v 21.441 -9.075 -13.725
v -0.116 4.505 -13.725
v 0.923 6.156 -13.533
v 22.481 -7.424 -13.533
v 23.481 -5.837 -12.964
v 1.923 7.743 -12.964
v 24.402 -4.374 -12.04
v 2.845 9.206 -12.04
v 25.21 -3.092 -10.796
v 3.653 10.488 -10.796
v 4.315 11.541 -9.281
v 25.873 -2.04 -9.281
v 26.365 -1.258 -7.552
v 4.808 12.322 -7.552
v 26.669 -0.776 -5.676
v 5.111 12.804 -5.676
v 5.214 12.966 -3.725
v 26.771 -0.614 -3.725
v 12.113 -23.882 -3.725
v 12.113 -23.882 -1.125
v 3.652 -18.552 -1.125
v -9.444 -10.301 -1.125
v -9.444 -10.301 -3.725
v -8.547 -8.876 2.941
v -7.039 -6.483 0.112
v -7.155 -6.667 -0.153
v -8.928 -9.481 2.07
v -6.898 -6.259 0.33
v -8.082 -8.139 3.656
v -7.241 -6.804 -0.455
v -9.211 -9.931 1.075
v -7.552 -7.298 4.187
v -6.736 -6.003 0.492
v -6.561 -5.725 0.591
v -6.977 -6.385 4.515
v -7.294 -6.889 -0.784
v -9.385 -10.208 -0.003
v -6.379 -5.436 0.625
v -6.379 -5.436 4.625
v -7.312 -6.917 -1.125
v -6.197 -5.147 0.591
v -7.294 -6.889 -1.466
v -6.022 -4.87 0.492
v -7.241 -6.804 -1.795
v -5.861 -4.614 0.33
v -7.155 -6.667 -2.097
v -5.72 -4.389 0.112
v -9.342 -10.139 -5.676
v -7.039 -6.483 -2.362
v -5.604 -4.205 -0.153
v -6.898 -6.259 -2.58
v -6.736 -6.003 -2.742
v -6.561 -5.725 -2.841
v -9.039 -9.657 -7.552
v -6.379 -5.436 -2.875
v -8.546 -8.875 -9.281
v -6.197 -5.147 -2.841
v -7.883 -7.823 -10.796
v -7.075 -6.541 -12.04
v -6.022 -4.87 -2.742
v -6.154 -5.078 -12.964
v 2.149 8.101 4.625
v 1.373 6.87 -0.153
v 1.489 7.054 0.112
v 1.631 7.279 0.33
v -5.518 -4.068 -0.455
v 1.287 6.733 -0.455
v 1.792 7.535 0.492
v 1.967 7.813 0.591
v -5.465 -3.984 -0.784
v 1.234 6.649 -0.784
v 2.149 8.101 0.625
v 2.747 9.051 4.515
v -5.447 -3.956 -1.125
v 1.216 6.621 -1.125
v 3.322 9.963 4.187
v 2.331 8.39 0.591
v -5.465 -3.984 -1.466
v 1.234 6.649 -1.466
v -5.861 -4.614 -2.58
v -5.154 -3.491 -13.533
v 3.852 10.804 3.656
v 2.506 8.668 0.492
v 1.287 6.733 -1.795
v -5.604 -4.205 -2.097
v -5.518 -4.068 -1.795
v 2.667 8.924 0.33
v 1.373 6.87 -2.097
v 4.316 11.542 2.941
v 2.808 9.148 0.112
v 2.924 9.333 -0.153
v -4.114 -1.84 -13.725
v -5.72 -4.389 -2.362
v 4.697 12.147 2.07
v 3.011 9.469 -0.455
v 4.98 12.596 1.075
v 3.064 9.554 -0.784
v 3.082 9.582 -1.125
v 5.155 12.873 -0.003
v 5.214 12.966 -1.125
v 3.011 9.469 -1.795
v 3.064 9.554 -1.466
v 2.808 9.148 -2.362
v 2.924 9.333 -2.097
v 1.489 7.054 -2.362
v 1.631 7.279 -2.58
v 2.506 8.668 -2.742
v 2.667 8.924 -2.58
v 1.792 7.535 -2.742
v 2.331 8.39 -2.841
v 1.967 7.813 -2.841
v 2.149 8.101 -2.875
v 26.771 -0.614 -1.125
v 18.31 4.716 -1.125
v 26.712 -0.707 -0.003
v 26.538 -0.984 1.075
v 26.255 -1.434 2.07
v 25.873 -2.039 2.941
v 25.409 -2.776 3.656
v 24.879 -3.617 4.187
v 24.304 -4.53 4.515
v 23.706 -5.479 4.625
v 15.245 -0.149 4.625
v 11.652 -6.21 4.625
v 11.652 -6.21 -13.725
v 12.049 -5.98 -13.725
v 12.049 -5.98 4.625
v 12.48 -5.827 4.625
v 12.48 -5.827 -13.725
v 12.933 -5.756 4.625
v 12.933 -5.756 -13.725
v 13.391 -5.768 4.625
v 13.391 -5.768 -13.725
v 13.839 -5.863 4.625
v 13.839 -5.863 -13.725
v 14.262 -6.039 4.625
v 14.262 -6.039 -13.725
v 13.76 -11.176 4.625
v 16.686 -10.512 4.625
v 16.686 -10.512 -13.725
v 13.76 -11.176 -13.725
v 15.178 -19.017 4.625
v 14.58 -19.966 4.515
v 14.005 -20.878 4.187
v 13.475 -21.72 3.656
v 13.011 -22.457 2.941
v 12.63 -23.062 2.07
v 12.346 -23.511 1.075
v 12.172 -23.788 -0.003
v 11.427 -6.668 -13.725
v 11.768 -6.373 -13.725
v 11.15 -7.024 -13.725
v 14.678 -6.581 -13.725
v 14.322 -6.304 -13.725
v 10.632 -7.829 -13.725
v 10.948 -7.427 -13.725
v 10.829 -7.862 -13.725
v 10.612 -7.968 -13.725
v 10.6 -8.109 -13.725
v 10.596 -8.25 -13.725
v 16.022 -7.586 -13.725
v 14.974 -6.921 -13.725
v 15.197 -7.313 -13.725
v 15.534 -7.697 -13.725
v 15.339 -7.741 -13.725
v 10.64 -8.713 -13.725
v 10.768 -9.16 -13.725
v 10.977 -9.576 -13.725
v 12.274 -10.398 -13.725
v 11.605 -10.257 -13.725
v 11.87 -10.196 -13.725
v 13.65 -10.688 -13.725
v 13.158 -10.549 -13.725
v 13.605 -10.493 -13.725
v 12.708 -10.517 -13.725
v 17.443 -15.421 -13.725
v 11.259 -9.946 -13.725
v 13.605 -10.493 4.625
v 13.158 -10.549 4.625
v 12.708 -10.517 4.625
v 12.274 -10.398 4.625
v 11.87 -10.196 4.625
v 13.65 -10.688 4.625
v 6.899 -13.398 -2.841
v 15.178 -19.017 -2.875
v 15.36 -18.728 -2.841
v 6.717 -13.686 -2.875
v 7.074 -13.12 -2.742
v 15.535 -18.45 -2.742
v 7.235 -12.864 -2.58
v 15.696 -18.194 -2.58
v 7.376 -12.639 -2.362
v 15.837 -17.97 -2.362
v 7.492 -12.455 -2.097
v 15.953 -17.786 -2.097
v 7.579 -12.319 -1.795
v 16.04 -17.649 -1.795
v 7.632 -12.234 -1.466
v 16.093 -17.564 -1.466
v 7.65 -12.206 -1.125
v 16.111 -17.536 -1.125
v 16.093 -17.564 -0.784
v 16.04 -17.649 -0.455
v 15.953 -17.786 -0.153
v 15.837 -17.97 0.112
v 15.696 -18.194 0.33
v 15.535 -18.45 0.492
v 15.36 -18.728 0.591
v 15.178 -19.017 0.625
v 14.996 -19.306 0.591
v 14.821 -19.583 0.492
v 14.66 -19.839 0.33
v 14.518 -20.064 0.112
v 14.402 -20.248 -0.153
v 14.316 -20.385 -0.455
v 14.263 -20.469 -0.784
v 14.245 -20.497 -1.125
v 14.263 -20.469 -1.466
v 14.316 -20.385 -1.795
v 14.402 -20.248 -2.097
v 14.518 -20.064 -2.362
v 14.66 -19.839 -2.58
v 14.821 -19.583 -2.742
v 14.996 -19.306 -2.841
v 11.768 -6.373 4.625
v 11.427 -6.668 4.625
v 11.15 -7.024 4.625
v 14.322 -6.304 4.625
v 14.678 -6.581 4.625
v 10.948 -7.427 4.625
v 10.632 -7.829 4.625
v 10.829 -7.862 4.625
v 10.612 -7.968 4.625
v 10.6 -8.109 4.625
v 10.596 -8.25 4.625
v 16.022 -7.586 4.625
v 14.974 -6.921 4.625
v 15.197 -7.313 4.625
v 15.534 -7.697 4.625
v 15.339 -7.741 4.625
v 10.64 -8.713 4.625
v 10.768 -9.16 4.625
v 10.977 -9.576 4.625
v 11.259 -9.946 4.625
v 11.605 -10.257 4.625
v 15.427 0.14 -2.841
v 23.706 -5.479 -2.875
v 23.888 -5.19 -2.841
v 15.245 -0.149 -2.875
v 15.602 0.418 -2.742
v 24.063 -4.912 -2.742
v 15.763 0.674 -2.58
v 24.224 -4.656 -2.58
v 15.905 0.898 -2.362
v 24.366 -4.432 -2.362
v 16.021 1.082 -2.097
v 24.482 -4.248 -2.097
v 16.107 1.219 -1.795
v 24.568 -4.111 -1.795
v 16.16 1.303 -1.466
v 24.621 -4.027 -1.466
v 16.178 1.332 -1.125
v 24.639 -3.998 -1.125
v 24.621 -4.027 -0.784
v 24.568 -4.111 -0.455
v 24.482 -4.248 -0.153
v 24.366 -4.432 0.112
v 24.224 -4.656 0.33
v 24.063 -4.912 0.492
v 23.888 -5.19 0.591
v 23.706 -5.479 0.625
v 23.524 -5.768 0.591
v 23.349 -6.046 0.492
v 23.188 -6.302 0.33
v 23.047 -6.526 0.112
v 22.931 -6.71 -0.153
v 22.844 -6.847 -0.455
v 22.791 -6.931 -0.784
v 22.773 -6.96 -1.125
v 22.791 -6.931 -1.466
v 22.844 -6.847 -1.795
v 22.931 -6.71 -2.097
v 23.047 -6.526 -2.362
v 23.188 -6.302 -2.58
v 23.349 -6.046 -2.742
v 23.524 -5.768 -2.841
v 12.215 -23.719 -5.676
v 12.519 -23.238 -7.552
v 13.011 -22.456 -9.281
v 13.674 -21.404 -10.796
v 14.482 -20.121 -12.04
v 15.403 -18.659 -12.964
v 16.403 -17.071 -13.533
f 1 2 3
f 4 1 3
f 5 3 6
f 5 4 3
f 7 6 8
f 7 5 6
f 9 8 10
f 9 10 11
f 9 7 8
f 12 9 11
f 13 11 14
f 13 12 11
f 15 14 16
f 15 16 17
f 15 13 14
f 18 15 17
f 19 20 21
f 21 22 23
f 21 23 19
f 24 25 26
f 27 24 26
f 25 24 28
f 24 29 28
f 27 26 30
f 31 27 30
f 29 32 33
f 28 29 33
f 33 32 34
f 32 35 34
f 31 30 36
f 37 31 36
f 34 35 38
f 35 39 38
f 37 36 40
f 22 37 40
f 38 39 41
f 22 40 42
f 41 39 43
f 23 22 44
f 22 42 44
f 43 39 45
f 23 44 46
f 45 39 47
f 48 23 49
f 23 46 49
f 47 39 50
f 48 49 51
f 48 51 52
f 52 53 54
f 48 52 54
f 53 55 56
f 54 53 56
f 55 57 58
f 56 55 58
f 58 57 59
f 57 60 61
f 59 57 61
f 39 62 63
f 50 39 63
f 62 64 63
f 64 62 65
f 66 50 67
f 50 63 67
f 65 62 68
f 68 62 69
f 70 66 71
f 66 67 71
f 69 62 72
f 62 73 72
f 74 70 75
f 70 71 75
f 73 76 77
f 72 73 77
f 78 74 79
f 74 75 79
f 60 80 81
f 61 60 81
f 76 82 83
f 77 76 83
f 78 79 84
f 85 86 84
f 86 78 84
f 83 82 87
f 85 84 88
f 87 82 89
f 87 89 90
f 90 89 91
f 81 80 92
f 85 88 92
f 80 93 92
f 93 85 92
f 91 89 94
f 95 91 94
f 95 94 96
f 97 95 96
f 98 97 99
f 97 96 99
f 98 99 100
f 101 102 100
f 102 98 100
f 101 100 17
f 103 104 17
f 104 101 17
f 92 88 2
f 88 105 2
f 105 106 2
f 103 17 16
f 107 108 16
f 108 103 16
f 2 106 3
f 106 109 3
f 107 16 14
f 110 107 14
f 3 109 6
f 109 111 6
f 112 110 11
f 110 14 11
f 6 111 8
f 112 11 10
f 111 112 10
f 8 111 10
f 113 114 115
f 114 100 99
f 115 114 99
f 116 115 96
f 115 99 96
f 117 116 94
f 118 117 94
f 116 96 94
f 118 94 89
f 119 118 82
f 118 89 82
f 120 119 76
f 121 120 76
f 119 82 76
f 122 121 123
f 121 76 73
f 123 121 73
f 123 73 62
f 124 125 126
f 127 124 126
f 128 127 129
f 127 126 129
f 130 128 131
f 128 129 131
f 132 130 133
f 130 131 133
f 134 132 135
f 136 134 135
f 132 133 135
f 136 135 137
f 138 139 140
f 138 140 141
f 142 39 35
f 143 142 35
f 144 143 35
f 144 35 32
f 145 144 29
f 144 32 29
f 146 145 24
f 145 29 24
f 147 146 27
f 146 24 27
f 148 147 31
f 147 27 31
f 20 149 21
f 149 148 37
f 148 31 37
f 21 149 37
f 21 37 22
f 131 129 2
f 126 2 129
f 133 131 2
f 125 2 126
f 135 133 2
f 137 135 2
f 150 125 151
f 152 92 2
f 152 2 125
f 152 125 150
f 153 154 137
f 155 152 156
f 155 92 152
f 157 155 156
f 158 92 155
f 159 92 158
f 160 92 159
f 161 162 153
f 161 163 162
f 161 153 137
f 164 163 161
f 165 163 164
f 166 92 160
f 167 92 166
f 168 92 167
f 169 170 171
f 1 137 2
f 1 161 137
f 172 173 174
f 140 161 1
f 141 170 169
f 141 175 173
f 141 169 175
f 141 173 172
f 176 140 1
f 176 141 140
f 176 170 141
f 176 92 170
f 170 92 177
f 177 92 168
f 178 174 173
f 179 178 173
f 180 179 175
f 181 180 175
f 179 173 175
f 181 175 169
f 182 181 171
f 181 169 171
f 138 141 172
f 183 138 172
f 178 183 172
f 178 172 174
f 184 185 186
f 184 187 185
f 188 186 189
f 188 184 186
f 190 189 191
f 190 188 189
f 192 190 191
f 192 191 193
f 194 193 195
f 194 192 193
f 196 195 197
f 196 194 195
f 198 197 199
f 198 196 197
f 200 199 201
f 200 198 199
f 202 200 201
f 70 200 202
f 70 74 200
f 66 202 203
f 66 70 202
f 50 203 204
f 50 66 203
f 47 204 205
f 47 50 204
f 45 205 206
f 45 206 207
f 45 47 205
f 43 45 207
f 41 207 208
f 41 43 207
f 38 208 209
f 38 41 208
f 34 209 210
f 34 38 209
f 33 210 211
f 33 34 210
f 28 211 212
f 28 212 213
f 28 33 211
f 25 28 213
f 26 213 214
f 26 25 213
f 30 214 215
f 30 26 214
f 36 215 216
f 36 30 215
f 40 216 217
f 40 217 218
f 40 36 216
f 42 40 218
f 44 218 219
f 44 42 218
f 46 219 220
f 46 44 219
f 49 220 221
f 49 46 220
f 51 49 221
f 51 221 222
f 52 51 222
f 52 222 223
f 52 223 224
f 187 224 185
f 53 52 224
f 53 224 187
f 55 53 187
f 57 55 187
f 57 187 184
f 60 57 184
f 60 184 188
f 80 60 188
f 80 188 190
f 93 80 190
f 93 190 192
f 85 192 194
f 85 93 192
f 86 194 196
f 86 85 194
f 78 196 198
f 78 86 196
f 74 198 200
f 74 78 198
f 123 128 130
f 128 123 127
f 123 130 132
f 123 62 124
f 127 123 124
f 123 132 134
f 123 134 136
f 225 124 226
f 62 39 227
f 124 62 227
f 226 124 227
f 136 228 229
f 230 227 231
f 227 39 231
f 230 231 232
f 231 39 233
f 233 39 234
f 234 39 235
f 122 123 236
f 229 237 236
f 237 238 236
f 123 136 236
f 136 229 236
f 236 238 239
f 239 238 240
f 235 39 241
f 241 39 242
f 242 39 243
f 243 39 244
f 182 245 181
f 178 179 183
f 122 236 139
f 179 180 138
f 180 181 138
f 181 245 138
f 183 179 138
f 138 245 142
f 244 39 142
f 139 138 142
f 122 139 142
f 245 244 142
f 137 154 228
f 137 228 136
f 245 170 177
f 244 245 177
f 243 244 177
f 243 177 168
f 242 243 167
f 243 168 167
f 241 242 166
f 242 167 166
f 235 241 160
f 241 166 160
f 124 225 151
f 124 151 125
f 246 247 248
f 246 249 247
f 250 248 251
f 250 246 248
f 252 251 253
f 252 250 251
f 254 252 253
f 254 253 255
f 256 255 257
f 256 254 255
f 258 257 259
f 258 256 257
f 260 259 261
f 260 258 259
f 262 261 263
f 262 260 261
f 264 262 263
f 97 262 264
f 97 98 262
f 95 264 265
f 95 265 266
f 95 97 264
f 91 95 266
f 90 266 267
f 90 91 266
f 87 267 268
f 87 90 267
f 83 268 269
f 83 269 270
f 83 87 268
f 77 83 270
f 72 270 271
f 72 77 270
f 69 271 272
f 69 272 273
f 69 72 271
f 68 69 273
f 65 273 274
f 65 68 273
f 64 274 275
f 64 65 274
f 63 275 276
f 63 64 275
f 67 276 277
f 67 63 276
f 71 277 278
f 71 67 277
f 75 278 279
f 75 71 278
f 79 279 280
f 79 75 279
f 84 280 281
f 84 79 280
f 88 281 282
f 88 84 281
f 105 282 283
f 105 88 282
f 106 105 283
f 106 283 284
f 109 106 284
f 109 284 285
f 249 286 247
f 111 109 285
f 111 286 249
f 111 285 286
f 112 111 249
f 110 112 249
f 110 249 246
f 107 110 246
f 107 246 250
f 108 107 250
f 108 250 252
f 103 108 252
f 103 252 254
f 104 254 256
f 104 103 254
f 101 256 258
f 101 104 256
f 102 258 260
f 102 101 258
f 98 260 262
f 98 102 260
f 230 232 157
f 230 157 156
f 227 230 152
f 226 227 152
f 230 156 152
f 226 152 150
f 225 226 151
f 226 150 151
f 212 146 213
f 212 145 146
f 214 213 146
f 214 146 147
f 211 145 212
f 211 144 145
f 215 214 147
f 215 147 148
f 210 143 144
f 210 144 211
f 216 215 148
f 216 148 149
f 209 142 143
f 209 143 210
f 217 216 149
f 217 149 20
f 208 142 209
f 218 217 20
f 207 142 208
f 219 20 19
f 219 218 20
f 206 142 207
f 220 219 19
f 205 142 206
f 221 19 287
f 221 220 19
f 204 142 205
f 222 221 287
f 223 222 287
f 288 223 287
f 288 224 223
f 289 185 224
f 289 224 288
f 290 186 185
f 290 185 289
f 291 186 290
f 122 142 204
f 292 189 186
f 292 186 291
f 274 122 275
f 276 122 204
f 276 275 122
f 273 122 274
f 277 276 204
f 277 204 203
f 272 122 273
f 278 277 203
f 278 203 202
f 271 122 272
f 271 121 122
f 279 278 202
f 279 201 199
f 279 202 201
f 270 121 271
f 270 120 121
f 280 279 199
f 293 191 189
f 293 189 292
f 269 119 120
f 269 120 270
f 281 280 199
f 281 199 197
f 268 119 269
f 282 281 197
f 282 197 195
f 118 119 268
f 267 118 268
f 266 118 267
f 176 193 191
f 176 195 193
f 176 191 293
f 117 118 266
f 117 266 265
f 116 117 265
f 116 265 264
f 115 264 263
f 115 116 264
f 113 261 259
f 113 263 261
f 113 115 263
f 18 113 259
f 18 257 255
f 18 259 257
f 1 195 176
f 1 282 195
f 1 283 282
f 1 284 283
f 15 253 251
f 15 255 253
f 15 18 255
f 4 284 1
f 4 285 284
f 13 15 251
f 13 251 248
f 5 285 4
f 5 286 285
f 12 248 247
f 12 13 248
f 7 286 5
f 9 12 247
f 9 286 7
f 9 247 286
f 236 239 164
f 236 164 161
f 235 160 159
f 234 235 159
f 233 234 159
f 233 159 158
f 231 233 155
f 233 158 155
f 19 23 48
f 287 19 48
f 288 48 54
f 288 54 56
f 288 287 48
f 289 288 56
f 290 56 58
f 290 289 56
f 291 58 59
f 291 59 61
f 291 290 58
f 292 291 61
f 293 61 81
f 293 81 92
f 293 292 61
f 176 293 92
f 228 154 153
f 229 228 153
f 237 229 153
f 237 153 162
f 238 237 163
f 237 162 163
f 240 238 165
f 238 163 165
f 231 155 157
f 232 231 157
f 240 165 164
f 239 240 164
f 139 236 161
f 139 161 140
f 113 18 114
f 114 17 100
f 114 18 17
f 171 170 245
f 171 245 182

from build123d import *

# Parameters (mm, degrees)
SKETCH1_R           = 1.75
BOSS_EXTRUDE1_DEPTH = 15.478309227
SKETCH2_R           = 1.75
BOSS_EXTRUDE2_DEPTH = 10
SKETCH5_W           = 2.4
SKETCH5_H           = 27.5
CUT_EXTRUDE1_DEPTH  = 15.478309227
CUT_EXTRUDE2_DEPTH  = 18.35
FILLET1_R           = 10
CHAMFER1_SIZE       = 0.2


with BuildPart() as part:
    # Sketch1 → Boss-Extrude1 (new body)
    with BuildSketch(Plane(origin=(-2.115260895, 1.332543188, 0), x_dir=(0, 0, -1), z_dir=(0.8461043578704047, -0.533017275135347, 0))):
        with BuildLine():
            Line((16.124998711, 13.75), (1.124998711, 13.75))
            ThreePointArc((1.124998711, 13.75), (-2.94086528, 12.065863992), (-4.625001289, 8))
            Line((-4.625001289, 8), (-4.625001289, -8))
            ThreePointArc((-4.625001289, -8), (-2.94086528, -12.065863992), (1.124998711, -13.75))
            Line((1.124998711, -13.75), (16.124998711, -13.75))
            Line((16.124998711, -13.75), (16.124998711, 13.75))
        make_face()
        with Locations(Location((1.124998711, 8, 0), (0, 0, 90))):
            Circle(SKETCH1_R, mode=Mode.SUBTRACT)
        with Locations(Location((1.124998711, -8, 0), (0, 0, 90))):
            Circle(SKETCH1_R, mode=Mode.SUBTRACT)
    extrude(amount=BOSS_EXTRUDE1_DEPTH)

    # Sketch2 → Boss-Extrude2 (add)
    with BuildSketch(Plane(origin=(10.981003995, -6.91766302, 0), x_dir=(0, 0, -1), z_dir=(0.8461043578704048, -0.5330172751353467, 0))):
        with BuildLine():
            ThreePointArc((-4.625001289, -8), (-2.94086528, -12.065863992), (1.124998711, -13.75))
            Line((1.124998711, -13.75), (13.724998711, -13.75))
            Line((13.724998711, -13.75), (13.724998711, -2.9))
            Line((13.724998711, -2.9), (13.724998711, 0))
            Line((13.724998711, 0), (13.724998711, 2.9))
            Line((13.724998711, 2.9), (13.724998711, 13.75))
            Line((13.724998711, 13.75), (1.124998711, 13.75))
            ThreePointArc((1.124998711, 13.75), (-2.94086528, 12.065863992), (-4.625001289, 8))
            Line((-4.625001289, 8), (-4.625001289, -8))
        make_face()
        with Locations((1.124998711, -8)):
            Circle(SKETCH2_R, mode=Mode.SUBTRACT)
        with Locations((1.124998711, 8)):
            Circle(SKETCH2_R, mode=Mode.SUBTRACT)
    extrude(amount=BOSS_EXTRUDE2_DEPTH)

    # Sketch5 → Cut-Extrude1 (cut)
    with BuildSketch(Plane(origin=(10.981003995, -6.91766302, 0), x_dir=(0, 0, -1), z_dir=(0.8461043578704048, -0.5330172751353467, 0))):
        with Locations((14.924998711, 0)):
            Rectangle(SKETCH5_W, SKETCH5_H)
    extrude(amount=-CUT_EXTRUDE1_DEPTH, mode=Mode.SUBTRACT)

    # Sketch7 → Cut-Extrude2 (cut)
    with BuildSketch(Plane(origin=(0, 0, -13.724998711), x_dir=(-1, 0, 0), z_dir=(0, 0, -1))):
        with BuildLine():
            Line((-16.021823666, -7.58604821), (-16.685981664, -10.511606986))
            Line((-16.685981664, -10.511606986), (-13.760422887, -11.175764984))
            ThreePointArc((-13.760422887, -11.175764984), (-15.634577963, -9.849258033), (-16.021823666, -7.58604821))
        make_face()
        with BuildLine():
            ThreePointArc((-16.021823666, -7.58604821), (-15.634577963, -9.849258033), (-13.760422887, -11.175764984))
            Line((-13.760422887, -11.175764984), (-13.649729888, -10.688171855))
            ThreePointArc((-13.649729888, -10.688171855), (-15.211525784, -9.582749396), (-15.534230536, -7.69674121))
            Line((-15.534230536, -7.69674121), (-16.021823666, -7.58604821))
        make_face()
        with BuildLine():
            ThreePointArc((-15.534230536, -7.69674121), (-15.211525784, -9.582749396), (-13.649729888, -10.688171855))
            Line((-13.649729888, -10.688171855), (-13.605452688, -10.493134603))
            ThreePointArc((-13.605452688, -10.493134603), (-15.042304913, -9.476145941), (-15.339193285, -7.741018409))
            Line((-15.339193285, -7.741018409), (-15.534230536, -7.69674121))
        make_face()
        with BuildLine():
            ThreePointArc((-15.339193285, -7.741018409), (-15.042304913, -9.476145941), (-13.605452688, -10.493134603))
            Line((-13.605452688, -10.493134603), (-13.096264889, -8.250206208))
            Line((-13.096264889, -8.250206208), (-15.339193285, -7.741018409))
        make_face()
        with BuildLine():
            Line((-13.096264889, -8.250206208), (-13.605452688, -10.493134603))
            ThreePointArc((-13.605452688, -10.493134603), (-12.708361538, -10.517259579), (-11.870325157, -10.196246231))
            Line((-11.870325157, -10.196246231), (-13.096264889, -8.250206208))
        make_face()
        with BuildLine():
            ThreePointArc((-14.322204622, -6.304166185), (-14.973602792, -6.921446486), (-15.339193285, -7.741018409))
            Line((-15.339193285, -7.741018409), (-13.096264889, -8.250206208))
            Line((-13.096264889, -8.250206208), (-14.322204622, -6.304166185))
        make_face()
        with BuildLine():
            Line((-10.829211518, -7.862302856), (-13.096264889, -8.250206208))
            Line((-13.096264889, -8.250206208), (-11.870325157, -10.196246231))
            ThreePointArc((-11.870325157, -10.196246231), (-11.082603872, -9.361587919), (-10.796264889, -8.250206208))
            ThreePointArc((-10.796264889, -8.250206208), (-10.804516348, -8.055556207), (-10.829211518, -7.862302856))
        make_face()
        with BuildLine():
            Line((-11.870325157, -10.196246231), (-11.763721702, -10.365467103))
            ThreePointArc((-11.763721702, -10.365467103), (-10.907502914, -9.458229807), (-10.596264889, -8.250206208))
            ThreePointArc((-10.596264889, -8.250206208), (-10.605233866, -8.038630121), (-10.632076442, -7.82857213))
            Line((-10.632076442, -7.82857213), (-10.829211518, -7.862302856))
            ThreePointArc((-10.829211518, -7.862302856), (-10.804516348, -8.055556207), (-10.796264889, -8.250206208))
            ThreePointArc((-10.796264889, -8.250206208), (-11.082603872, -9.361587919), (-11.870325157, -10.196246231))
        make_face()
        with BuildLine():
            Line((-14.322204622, -6.304166185), (-13.096264889, -8.250206208))
            Line((-13.096264889, -8.250206208), (-11.767505167, -6.372868305))
            ThreePointArc((-11.767505167, -6.372868305), (-13.034434615, -5.951037441), (-14.322204622, -6.304166185))
        make_face()
        with BuildLine():
            ThreePointArc((-11.651960844, -6.209621531), (-13.029058069, -5.751109722), (-14.428808077, -6.134945313))
            Line((-14.428808077, -6.134945313), (-14.322204622, -6.304166185))
            ThreePointArc((-14.322204622, -6.304166185), (-13.034434615, -5.951037441), (-11.767505167, -6.372868305))
            Line((-11.767505167, -6.372868305), (-11.651960844, -6.209621531))
        make_face()
        with BuildLine():
            Line((-11.767505167, -6.372868305), (-13.096264889, -8.250206208))
            Line((-13.096264889, -8.250206208), (-10.829211518, -7.862302856))
            ThreePointArc((-10.829211518, -7.862302856), (-11.150224866, -7.024266475), (-11.767505167, -6.372868305))
        make_face()
    extrude(amount=-CUT_EXTRUDE2_DEPTH, mode=Mode.SUBTRACT)

    # Fillet1
    fillet1_edges = [part.edges().sort_by_distance(p)[0] for p in [
        (1.334405806, -17.091581212, -13.724998711),
        (15.992380872, 6.176288629, -13.724998711),
    ]]
    fillet(fillet1_edges, radius=FILLET1_R)

    # Chamfer1
    # the kernel refuses this chamfer: 0.2 mm, written as the material it adds along each edge
    with BuildSketch(Plane(origin=(14.428808077, -6.134945313, -13.724998711), x_dir=(-0.533017275135546, -0.8461043578702794, 0), z_dir=(0, 0, 1))) as chamfer1_piece_1_section:
        with BuildLine():
            Line((CHAMFER1_SIZE, 0), (0.007427842, -0.192572158))
            ThreePointArc((0.007427842, -0.192572158), (0.001963813, -0.09907174), (0, 0))
            Line((0, 0), (CHAMFER1_SIZE, 0))
        make_face()
    chamfer1_piece_1 = extrude(amount=18.35, mode=Mode.PRIVATE)
    chamfer1_piece_1 = chamfer1_piece_1 - Plane(origin=(13.096264889, -8.250206208, -13.724998711), x_dir=(0.5330172751353905, 0.8461043578703773, 0), z_dir=(0, 0, -1)) * Cylinder(2.3, 38, mode=Mode.PRIVATE)
    add(chamfer1_piece_1)
    with BuildSketch(Plane(origin=(11.763721702, -10.365467103, -13.724998711), x_dir=(-0.8249315284266814, 0.5652326719215895, 0), z_dir=(0, 0, 1))) as chamfer1_piece_2_section:
        with BuildLine():
            Line((0.192715357, 0), (CHAMFER1_SIZE * 0.0385430714682, -CHAMFER1_SIZE * 0.999256939752))
            Line((CHAMFER1_SIZE * 0.0385430714682, -CHAMFER1_SIZE * 0.999256939752), (0, 0))
            ThreePointArc((0, 0), (0.099073815, 0.001856175), (0.192715357, 0))
        make_face()
    chamfer1_piece_2 = extrude(amount=18.35, mode=Mode.PRIVATE)
    chamfer1_piece_2 = chamfer1_piece_2 - Plane(origin=(13.096264889, -8.250206208, -13.724998711), x_dir=(0.22138599930385242, -0.9751862587794369, 0), z_dir=(0, 0, -1)) * Cylinder(2.3, 38, mode=Mode.PRIVATE)
    add(chamfer1_piece_2)


solid = part.part
